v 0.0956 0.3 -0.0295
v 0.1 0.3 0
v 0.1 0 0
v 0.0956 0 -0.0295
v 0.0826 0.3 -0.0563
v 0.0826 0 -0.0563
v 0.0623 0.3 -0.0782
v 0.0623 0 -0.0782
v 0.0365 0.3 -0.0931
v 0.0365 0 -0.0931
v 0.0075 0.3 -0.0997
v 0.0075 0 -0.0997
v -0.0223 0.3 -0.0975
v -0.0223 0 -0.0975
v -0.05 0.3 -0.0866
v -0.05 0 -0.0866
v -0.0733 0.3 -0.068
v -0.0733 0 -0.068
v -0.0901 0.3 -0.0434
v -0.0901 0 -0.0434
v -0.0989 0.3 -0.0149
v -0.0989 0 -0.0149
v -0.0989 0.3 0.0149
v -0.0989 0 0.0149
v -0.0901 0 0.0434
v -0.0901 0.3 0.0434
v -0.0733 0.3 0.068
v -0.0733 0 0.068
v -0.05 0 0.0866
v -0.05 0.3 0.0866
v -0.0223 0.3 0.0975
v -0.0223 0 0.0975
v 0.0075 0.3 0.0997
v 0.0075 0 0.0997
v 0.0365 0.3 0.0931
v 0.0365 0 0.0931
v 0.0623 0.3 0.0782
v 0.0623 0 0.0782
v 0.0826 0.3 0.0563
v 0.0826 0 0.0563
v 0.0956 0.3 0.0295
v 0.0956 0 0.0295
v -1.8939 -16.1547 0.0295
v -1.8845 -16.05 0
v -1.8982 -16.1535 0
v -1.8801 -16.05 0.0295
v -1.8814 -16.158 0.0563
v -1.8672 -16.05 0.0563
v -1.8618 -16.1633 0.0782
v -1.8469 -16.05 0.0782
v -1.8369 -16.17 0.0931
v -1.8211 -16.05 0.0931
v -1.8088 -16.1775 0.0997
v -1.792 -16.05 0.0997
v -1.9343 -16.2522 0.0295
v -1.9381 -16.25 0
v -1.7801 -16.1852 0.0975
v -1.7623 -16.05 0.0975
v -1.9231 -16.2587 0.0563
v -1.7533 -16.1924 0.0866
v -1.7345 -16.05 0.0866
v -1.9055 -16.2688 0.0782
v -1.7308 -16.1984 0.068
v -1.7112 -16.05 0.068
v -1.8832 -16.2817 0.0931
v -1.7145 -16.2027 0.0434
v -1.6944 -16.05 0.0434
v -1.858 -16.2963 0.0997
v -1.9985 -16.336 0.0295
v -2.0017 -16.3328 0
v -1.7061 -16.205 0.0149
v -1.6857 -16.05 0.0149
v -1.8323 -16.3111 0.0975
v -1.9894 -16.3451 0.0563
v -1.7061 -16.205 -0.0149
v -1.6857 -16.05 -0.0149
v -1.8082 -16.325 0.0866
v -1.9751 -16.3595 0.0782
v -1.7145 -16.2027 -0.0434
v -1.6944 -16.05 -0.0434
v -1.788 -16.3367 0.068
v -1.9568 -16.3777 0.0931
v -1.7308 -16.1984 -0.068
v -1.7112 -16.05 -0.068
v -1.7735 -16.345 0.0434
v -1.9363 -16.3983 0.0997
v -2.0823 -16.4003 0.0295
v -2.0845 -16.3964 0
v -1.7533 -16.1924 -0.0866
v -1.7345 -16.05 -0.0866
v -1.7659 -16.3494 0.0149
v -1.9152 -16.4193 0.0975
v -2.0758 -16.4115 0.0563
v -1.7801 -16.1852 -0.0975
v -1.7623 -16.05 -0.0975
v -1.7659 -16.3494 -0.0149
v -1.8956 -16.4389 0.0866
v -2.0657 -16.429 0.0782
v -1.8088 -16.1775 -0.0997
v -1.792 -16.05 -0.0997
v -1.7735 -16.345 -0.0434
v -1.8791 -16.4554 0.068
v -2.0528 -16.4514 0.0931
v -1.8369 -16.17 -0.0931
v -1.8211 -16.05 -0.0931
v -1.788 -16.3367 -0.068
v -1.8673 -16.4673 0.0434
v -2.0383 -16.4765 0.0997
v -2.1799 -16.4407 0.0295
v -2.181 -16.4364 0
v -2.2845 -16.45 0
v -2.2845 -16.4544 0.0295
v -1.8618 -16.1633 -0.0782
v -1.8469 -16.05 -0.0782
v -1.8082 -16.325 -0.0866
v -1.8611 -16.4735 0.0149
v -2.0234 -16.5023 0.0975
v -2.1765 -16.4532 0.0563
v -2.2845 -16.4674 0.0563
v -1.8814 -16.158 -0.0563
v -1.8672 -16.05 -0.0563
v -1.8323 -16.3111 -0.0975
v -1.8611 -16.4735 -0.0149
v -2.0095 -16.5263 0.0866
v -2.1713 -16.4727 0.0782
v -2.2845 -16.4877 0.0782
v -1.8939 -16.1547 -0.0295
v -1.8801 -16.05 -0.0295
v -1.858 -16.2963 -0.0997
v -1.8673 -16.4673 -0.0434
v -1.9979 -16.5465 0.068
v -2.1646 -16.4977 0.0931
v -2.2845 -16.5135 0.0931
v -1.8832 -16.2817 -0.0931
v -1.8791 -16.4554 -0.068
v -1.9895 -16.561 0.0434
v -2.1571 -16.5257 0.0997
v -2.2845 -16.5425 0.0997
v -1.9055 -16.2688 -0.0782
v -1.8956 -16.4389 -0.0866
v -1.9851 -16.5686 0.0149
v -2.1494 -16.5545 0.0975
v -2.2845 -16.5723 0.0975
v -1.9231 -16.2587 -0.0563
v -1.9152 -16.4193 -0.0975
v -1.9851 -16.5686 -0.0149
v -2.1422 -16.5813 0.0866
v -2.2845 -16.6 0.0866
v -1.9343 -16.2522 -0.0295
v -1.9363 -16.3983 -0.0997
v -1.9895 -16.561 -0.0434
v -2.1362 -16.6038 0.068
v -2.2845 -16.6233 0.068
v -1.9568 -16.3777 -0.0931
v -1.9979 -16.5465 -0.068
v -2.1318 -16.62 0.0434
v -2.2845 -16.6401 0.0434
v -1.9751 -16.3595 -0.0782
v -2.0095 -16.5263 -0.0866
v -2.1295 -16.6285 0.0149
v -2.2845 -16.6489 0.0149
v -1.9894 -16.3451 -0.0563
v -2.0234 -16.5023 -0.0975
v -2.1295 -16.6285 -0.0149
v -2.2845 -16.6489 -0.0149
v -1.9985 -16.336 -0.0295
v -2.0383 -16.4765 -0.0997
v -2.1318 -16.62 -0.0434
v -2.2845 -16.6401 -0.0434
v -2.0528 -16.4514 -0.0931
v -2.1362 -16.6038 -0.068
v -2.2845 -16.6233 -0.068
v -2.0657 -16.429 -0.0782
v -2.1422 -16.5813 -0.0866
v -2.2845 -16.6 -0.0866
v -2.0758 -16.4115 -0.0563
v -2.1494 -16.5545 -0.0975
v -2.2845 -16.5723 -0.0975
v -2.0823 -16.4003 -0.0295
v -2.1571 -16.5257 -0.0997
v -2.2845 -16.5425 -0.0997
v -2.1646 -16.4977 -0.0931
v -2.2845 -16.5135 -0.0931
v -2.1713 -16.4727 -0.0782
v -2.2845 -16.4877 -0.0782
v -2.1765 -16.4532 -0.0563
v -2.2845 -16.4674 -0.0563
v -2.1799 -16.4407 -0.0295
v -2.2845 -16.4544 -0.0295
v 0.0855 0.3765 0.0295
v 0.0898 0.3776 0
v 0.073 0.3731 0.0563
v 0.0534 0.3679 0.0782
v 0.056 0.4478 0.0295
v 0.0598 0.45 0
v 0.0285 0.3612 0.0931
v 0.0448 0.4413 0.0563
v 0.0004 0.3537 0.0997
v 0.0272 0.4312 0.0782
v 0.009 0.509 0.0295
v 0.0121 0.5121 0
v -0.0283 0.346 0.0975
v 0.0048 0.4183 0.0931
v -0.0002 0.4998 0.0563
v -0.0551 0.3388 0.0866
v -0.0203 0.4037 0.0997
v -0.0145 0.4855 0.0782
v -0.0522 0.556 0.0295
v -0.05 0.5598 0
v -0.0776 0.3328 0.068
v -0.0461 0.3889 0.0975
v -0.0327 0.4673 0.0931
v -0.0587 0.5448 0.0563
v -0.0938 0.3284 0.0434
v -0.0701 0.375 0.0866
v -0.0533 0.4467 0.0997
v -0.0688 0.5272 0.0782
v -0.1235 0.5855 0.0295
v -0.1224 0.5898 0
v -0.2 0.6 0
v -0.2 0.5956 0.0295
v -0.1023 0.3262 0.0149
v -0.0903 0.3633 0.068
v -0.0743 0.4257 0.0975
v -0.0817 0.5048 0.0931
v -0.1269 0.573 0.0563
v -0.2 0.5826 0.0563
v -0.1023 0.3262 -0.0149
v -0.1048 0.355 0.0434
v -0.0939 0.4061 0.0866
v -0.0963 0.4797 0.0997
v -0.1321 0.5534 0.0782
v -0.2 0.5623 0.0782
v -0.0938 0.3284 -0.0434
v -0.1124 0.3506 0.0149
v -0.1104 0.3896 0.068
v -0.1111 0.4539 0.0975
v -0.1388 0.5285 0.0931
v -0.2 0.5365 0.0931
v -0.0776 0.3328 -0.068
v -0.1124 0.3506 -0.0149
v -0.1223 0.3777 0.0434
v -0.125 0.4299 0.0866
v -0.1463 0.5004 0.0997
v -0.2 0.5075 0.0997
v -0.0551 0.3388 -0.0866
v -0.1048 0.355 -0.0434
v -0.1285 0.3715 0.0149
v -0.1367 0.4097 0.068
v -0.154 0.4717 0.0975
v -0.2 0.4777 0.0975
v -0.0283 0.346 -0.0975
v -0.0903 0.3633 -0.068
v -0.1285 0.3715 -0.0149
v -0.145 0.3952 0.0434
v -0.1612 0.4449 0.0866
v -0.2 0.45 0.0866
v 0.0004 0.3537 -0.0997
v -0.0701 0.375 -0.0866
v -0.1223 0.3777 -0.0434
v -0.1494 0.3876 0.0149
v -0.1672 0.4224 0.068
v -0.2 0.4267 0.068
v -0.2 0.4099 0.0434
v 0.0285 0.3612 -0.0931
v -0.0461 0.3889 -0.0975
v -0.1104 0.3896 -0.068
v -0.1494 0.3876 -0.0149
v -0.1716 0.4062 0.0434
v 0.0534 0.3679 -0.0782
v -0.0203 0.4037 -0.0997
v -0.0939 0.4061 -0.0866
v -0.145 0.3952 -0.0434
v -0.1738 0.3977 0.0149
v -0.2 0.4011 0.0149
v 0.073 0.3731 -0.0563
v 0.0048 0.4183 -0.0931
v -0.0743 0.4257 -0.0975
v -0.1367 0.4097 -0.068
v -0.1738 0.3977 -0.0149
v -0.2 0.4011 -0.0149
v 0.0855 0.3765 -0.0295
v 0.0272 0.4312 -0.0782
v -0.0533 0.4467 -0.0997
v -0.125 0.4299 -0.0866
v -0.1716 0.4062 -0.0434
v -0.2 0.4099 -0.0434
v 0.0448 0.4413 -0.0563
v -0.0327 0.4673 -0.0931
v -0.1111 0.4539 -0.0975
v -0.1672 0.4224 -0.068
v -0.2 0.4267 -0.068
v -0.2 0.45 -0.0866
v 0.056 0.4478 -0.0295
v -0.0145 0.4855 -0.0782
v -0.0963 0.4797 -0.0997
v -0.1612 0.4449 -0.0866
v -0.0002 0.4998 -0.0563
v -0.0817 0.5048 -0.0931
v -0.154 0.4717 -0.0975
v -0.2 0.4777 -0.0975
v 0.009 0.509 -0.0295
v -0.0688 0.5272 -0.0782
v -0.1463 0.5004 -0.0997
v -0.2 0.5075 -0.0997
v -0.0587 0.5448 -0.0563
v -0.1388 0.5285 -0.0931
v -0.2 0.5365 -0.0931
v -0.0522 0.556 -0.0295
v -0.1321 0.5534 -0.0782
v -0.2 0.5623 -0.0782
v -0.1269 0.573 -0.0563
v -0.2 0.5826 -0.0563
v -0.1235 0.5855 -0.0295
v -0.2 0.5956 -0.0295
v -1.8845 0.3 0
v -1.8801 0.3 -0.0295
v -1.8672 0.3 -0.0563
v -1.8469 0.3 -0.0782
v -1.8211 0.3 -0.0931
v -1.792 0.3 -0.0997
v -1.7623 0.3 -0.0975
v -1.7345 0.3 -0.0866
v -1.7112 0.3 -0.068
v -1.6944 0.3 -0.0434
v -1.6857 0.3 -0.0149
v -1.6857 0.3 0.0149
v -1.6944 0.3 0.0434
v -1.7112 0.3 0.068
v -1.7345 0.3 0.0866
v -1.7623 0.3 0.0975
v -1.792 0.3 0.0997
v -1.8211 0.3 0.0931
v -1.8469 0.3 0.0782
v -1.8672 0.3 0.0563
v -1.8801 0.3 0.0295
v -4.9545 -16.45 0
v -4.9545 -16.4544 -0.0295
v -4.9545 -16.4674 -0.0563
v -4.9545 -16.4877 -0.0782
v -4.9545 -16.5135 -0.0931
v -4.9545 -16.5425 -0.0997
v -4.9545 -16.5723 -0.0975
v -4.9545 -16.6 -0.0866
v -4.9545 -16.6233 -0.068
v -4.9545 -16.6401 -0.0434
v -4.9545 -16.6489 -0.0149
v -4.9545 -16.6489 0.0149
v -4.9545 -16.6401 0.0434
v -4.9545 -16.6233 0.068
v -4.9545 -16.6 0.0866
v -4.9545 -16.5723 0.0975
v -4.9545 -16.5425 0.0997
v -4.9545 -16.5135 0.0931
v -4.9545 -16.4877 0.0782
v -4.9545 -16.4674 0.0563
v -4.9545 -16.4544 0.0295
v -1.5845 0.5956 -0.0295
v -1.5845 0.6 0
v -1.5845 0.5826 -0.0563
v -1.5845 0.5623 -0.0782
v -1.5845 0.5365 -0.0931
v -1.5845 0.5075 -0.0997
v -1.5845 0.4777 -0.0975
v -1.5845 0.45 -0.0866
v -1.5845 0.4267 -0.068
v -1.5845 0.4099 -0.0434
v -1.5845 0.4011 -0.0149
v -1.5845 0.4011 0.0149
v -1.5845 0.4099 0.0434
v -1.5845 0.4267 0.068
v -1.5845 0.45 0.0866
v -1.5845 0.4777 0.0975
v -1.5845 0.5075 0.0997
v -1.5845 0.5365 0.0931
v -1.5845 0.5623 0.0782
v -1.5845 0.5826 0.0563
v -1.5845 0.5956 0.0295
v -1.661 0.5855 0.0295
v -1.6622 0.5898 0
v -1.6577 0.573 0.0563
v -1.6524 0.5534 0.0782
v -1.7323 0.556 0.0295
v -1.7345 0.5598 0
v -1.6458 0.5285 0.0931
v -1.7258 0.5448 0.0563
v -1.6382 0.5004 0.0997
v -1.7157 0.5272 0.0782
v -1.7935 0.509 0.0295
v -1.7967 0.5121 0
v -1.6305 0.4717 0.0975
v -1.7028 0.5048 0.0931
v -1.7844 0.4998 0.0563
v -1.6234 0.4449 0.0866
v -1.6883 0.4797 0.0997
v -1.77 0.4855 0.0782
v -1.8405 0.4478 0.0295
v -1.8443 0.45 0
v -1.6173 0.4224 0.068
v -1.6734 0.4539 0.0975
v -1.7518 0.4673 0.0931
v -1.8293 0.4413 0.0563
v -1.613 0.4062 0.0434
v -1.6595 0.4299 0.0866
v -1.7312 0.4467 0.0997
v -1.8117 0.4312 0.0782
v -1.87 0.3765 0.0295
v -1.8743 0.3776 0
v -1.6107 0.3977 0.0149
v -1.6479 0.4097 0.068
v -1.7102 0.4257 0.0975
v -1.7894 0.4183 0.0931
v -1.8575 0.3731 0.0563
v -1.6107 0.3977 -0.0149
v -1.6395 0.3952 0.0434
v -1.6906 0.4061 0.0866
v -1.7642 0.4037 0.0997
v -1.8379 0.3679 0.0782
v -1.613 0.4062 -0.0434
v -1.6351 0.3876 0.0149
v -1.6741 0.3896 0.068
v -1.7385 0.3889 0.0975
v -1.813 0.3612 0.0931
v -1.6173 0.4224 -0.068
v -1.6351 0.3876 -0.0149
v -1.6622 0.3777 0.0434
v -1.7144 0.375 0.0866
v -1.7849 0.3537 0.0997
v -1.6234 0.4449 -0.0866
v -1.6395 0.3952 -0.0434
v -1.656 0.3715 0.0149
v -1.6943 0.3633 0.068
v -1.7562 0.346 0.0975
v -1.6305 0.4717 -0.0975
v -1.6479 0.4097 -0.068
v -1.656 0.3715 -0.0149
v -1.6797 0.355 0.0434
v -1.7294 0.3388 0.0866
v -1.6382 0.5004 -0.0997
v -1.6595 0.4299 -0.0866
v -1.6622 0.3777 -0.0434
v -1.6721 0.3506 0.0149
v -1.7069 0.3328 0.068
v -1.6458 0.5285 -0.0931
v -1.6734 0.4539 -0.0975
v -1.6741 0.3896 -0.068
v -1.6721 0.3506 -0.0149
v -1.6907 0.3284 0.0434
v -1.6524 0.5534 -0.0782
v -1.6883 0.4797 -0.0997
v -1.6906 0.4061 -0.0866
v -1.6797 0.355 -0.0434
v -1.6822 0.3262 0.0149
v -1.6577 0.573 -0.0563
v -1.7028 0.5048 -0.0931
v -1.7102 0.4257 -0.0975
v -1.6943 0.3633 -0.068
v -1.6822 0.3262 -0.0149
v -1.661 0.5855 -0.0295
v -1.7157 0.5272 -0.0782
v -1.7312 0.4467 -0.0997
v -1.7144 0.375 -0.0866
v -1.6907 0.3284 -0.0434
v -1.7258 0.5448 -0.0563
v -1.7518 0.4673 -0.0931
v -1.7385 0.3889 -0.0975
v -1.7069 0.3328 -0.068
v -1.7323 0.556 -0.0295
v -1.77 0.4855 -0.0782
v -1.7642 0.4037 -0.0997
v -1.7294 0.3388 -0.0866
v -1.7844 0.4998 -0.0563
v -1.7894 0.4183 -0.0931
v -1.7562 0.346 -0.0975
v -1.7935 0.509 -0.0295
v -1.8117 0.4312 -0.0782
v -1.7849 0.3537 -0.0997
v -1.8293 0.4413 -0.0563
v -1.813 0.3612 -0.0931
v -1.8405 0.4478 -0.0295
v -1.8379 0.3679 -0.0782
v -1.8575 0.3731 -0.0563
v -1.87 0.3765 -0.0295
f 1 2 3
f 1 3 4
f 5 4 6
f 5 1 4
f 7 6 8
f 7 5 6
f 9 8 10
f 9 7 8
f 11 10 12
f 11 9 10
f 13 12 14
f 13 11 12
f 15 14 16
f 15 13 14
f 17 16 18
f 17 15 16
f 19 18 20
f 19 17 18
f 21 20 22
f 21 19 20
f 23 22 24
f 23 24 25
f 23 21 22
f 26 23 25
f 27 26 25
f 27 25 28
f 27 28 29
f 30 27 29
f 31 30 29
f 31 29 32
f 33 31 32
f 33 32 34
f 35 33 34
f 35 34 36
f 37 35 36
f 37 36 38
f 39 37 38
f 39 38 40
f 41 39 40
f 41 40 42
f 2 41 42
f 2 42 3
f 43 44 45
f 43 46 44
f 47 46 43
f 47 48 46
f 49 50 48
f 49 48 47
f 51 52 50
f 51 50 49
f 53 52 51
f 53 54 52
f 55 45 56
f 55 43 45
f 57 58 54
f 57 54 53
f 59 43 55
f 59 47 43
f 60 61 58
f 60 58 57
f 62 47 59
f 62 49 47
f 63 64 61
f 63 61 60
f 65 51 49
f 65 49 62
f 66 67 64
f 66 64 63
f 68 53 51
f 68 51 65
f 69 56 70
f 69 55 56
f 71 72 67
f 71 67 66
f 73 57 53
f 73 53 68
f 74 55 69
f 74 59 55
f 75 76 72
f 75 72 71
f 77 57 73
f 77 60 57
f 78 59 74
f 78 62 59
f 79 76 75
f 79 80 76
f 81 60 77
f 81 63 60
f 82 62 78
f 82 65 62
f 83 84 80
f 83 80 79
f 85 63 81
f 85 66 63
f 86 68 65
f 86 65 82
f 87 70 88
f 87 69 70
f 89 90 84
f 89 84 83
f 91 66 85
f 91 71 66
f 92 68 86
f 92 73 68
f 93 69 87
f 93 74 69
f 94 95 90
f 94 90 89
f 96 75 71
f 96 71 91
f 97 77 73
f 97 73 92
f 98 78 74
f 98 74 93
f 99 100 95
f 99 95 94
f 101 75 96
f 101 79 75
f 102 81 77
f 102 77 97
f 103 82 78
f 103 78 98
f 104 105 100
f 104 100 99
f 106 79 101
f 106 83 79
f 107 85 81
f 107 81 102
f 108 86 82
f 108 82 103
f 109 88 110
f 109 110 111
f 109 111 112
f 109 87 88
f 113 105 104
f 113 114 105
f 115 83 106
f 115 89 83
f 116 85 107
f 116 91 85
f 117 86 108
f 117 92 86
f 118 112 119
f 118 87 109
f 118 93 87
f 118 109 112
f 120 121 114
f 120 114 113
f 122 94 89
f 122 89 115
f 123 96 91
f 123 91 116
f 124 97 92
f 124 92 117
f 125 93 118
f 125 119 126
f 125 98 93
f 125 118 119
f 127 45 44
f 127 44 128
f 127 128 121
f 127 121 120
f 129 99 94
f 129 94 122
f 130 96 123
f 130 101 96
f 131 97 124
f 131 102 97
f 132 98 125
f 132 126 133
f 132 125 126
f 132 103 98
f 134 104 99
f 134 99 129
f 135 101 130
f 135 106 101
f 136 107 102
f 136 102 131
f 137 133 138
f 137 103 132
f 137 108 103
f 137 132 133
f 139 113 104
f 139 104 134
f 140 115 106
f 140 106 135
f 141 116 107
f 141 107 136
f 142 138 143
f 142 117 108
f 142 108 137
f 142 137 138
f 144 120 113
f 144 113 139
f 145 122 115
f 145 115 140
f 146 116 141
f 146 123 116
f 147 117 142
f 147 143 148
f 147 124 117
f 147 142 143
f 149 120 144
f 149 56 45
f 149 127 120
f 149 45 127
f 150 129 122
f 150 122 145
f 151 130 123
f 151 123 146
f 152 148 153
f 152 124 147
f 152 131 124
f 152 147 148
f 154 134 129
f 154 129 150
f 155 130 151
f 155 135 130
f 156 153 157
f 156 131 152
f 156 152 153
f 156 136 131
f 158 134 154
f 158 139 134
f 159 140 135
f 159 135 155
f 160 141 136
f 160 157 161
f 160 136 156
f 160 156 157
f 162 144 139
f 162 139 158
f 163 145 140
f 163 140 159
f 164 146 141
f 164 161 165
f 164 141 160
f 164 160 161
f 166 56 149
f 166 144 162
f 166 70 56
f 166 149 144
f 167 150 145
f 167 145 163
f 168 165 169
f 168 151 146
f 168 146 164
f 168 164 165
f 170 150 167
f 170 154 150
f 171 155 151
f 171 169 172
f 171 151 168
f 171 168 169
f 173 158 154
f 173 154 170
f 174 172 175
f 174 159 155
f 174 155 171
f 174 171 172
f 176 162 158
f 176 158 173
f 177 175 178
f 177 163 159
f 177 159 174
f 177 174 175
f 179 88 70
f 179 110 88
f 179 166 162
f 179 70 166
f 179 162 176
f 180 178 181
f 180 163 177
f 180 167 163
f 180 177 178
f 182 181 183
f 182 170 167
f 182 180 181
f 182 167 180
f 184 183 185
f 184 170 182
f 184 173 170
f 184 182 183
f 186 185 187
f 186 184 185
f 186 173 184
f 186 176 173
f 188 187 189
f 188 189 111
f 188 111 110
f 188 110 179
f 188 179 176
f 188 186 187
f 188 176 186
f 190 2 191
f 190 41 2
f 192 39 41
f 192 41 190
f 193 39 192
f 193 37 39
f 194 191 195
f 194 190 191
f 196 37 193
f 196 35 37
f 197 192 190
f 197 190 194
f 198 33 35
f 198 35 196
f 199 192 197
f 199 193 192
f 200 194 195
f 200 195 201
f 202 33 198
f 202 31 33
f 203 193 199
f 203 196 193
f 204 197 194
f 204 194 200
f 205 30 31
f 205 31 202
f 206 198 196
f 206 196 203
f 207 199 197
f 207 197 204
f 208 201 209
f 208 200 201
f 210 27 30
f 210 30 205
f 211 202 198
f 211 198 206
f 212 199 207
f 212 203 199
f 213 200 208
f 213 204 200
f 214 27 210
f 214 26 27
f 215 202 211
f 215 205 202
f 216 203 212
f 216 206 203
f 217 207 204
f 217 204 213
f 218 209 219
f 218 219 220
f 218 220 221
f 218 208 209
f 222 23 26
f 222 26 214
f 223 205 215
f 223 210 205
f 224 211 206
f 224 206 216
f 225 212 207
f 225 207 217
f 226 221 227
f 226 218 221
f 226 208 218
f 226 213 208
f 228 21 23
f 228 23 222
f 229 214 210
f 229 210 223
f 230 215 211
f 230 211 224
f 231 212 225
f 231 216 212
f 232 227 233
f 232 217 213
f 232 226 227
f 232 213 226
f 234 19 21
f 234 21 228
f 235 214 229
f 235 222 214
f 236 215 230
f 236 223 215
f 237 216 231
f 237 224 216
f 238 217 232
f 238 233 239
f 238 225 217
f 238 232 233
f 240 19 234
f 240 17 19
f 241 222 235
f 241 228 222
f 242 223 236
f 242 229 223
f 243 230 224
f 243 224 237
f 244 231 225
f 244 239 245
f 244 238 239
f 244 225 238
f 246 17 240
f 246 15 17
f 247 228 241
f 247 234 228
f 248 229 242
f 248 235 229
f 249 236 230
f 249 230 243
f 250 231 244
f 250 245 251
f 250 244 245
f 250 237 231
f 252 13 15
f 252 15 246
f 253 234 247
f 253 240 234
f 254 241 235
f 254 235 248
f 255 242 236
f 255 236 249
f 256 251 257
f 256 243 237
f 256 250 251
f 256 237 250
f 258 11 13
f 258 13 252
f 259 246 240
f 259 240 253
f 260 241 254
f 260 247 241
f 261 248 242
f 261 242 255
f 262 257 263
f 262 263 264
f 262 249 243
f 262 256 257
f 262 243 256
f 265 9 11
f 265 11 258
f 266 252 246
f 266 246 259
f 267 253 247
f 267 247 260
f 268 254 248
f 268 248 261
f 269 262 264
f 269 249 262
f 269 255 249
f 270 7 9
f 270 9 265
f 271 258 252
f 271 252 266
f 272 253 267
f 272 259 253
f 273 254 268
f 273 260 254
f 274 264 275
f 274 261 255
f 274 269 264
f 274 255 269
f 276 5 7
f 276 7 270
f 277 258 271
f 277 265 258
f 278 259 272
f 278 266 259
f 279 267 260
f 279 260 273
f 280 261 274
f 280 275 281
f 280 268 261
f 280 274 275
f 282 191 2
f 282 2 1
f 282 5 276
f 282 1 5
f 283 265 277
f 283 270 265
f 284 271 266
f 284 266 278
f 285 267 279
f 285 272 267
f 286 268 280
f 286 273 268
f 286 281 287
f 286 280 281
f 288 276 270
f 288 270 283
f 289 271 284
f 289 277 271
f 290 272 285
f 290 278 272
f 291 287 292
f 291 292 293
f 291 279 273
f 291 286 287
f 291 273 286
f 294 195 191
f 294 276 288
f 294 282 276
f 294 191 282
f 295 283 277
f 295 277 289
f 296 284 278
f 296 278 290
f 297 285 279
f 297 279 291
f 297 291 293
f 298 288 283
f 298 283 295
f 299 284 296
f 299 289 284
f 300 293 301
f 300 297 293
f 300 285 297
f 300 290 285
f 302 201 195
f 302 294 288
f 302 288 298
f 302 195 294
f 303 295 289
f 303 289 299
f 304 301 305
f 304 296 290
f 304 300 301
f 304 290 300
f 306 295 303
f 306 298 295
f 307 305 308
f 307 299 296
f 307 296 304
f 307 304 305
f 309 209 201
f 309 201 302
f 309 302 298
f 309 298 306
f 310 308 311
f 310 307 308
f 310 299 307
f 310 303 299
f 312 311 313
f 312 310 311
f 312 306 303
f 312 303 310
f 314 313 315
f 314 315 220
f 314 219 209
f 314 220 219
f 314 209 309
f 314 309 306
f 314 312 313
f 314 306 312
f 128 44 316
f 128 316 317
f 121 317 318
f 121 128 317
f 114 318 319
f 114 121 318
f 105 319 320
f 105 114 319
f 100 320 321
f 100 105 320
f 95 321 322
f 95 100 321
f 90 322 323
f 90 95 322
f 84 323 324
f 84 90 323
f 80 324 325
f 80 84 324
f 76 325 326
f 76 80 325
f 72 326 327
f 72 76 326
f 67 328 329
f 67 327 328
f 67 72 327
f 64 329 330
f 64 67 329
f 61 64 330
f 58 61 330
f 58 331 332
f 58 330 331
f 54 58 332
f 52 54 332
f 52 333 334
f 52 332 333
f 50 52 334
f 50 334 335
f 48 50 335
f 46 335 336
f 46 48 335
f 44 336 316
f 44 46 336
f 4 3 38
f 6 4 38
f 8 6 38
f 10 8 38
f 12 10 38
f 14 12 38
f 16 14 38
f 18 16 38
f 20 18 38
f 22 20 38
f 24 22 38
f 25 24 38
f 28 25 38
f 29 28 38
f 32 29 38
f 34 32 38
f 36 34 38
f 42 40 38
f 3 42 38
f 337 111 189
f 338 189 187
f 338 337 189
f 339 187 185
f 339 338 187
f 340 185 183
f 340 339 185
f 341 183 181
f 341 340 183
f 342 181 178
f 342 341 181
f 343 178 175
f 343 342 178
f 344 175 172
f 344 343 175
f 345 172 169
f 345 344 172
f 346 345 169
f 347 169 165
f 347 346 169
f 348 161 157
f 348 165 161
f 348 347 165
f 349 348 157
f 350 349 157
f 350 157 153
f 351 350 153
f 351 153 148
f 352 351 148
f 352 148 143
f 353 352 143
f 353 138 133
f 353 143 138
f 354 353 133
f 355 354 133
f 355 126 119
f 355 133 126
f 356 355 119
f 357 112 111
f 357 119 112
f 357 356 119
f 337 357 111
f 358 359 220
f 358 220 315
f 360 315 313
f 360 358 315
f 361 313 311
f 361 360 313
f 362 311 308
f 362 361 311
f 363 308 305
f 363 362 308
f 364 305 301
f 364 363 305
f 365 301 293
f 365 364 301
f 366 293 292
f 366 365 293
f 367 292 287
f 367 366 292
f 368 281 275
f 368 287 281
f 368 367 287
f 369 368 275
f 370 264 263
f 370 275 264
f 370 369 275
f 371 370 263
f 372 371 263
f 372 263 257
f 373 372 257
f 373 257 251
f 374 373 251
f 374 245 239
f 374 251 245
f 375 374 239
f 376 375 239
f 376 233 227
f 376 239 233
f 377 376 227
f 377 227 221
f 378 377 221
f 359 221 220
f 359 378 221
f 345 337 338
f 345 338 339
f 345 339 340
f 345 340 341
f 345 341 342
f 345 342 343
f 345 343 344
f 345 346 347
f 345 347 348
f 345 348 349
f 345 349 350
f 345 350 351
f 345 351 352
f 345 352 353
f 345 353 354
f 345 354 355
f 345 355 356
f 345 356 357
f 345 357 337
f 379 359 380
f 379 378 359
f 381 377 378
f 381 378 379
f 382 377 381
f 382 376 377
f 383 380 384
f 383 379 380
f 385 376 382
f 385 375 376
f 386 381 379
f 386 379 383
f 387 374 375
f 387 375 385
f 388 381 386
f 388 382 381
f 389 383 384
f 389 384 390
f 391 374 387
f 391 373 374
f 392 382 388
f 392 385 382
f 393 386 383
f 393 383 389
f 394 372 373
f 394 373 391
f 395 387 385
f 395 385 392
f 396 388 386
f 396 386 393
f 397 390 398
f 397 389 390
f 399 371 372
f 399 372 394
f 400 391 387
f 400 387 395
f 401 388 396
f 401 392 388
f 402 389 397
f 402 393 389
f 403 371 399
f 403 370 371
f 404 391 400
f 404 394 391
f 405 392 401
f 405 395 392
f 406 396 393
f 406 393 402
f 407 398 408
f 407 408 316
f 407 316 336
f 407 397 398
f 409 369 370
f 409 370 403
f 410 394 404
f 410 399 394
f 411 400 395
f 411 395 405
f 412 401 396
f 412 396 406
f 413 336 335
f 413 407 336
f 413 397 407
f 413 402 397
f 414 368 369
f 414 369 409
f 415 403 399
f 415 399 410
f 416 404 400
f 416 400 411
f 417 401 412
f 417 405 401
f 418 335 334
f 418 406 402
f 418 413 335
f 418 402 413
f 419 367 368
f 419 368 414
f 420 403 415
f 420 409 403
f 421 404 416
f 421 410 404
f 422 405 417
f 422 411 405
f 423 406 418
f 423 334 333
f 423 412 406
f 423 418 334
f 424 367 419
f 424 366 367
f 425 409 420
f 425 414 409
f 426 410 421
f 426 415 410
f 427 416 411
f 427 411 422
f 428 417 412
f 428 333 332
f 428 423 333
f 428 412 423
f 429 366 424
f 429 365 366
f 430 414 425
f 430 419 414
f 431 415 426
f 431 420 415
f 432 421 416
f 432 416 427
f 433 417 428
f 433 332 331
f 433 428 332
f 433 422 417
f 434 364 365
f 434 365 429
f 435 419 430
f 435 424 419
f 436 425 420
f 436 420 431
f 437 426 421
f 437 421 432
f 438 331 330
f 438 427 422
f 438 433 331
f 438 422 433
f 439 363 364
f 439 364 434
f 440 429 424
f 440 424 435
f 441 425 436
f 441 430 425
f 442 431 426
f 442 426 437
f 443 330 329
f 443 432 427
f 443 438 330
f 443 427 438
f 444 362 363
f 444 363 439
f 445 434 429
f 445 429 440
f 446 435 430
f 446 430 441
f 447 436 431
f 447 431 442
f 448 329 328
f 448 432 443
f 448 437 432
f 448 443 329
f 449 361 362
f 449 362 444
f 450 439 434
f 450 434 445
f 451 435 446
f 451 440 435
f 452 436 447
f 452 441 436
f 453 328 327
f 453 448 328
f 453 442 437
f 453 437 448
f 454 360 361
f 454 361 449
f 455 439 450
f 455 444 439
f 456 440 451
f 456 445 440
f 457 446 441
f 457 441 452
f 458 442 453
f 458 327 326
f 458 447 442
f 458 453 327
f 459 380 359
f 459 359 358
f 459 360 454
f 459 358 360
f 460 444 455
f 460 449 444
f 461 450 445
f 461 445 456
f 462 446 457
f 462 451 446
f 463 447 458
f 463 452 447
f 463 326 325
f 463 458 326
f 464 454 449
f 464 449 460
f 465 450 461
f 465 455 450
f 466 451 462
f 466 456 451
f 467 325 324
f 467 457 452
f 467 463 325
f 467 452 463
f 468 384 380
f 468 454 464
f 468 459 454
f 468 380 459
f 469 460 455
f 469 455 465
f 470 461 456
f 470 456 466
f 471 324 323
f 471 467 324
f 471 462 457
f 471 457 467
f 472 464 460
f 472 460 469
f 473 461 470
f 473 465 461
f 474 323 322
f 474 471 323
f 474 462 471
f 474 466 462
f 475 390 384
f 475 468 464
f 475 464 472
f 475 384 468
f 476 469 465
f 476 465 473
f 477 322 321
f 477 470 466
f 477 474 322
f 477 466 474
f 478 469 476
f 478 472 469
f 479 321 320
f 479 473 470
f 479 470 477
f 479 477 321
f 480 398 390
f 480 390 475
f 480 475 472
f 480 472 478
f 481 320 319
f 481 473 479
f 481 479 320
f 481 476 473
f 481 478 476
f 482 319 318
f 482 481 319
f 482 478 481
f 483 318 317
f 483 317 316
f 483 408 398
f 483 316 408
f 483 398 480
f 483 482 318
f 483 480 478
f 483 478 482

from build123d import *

# Parameters (mm, degrees)
ESQUISSE2_R = 0.1


with BuildPart() as part:
    # Balayage1: sweep along a path in Esquisse1
    with BuildLine(Plane.XY) as balayage1_path:
        Line((0, 0), (0, 0.3))
        ThreePointArc((0, 0.3), (-0.058578644, 0.441421356), (-0.2, 0.5))
        Line((-0.2, 0.5), (-1.584533741, 0.5))
        ThreePointArc((-1.584533741, 0.5), (-1.725955098, 0.441421356), (-1.784533741, 0.3))
        Line((-1.784533741, 0.3), (-1.784533741, -16.05))
        ThreePointArc((-1.784533741, -16.05), (-1.930980351, -16.403553391), (-2.284533741, -16.55))
        Line((-2.284533741, -16.55), (-4.954533741, -16.55))
    # Esquisse2 → Balayage1 (sweep)
    with BuildSketch(Plane(origin=(0, 0, 0), x_dir=(1, 0, 0), z_dir=(0, 1, 0))):
        Circle(ESQUISSE2_R)
    sweep(path=balayage1_path.line)


solid = part.part
